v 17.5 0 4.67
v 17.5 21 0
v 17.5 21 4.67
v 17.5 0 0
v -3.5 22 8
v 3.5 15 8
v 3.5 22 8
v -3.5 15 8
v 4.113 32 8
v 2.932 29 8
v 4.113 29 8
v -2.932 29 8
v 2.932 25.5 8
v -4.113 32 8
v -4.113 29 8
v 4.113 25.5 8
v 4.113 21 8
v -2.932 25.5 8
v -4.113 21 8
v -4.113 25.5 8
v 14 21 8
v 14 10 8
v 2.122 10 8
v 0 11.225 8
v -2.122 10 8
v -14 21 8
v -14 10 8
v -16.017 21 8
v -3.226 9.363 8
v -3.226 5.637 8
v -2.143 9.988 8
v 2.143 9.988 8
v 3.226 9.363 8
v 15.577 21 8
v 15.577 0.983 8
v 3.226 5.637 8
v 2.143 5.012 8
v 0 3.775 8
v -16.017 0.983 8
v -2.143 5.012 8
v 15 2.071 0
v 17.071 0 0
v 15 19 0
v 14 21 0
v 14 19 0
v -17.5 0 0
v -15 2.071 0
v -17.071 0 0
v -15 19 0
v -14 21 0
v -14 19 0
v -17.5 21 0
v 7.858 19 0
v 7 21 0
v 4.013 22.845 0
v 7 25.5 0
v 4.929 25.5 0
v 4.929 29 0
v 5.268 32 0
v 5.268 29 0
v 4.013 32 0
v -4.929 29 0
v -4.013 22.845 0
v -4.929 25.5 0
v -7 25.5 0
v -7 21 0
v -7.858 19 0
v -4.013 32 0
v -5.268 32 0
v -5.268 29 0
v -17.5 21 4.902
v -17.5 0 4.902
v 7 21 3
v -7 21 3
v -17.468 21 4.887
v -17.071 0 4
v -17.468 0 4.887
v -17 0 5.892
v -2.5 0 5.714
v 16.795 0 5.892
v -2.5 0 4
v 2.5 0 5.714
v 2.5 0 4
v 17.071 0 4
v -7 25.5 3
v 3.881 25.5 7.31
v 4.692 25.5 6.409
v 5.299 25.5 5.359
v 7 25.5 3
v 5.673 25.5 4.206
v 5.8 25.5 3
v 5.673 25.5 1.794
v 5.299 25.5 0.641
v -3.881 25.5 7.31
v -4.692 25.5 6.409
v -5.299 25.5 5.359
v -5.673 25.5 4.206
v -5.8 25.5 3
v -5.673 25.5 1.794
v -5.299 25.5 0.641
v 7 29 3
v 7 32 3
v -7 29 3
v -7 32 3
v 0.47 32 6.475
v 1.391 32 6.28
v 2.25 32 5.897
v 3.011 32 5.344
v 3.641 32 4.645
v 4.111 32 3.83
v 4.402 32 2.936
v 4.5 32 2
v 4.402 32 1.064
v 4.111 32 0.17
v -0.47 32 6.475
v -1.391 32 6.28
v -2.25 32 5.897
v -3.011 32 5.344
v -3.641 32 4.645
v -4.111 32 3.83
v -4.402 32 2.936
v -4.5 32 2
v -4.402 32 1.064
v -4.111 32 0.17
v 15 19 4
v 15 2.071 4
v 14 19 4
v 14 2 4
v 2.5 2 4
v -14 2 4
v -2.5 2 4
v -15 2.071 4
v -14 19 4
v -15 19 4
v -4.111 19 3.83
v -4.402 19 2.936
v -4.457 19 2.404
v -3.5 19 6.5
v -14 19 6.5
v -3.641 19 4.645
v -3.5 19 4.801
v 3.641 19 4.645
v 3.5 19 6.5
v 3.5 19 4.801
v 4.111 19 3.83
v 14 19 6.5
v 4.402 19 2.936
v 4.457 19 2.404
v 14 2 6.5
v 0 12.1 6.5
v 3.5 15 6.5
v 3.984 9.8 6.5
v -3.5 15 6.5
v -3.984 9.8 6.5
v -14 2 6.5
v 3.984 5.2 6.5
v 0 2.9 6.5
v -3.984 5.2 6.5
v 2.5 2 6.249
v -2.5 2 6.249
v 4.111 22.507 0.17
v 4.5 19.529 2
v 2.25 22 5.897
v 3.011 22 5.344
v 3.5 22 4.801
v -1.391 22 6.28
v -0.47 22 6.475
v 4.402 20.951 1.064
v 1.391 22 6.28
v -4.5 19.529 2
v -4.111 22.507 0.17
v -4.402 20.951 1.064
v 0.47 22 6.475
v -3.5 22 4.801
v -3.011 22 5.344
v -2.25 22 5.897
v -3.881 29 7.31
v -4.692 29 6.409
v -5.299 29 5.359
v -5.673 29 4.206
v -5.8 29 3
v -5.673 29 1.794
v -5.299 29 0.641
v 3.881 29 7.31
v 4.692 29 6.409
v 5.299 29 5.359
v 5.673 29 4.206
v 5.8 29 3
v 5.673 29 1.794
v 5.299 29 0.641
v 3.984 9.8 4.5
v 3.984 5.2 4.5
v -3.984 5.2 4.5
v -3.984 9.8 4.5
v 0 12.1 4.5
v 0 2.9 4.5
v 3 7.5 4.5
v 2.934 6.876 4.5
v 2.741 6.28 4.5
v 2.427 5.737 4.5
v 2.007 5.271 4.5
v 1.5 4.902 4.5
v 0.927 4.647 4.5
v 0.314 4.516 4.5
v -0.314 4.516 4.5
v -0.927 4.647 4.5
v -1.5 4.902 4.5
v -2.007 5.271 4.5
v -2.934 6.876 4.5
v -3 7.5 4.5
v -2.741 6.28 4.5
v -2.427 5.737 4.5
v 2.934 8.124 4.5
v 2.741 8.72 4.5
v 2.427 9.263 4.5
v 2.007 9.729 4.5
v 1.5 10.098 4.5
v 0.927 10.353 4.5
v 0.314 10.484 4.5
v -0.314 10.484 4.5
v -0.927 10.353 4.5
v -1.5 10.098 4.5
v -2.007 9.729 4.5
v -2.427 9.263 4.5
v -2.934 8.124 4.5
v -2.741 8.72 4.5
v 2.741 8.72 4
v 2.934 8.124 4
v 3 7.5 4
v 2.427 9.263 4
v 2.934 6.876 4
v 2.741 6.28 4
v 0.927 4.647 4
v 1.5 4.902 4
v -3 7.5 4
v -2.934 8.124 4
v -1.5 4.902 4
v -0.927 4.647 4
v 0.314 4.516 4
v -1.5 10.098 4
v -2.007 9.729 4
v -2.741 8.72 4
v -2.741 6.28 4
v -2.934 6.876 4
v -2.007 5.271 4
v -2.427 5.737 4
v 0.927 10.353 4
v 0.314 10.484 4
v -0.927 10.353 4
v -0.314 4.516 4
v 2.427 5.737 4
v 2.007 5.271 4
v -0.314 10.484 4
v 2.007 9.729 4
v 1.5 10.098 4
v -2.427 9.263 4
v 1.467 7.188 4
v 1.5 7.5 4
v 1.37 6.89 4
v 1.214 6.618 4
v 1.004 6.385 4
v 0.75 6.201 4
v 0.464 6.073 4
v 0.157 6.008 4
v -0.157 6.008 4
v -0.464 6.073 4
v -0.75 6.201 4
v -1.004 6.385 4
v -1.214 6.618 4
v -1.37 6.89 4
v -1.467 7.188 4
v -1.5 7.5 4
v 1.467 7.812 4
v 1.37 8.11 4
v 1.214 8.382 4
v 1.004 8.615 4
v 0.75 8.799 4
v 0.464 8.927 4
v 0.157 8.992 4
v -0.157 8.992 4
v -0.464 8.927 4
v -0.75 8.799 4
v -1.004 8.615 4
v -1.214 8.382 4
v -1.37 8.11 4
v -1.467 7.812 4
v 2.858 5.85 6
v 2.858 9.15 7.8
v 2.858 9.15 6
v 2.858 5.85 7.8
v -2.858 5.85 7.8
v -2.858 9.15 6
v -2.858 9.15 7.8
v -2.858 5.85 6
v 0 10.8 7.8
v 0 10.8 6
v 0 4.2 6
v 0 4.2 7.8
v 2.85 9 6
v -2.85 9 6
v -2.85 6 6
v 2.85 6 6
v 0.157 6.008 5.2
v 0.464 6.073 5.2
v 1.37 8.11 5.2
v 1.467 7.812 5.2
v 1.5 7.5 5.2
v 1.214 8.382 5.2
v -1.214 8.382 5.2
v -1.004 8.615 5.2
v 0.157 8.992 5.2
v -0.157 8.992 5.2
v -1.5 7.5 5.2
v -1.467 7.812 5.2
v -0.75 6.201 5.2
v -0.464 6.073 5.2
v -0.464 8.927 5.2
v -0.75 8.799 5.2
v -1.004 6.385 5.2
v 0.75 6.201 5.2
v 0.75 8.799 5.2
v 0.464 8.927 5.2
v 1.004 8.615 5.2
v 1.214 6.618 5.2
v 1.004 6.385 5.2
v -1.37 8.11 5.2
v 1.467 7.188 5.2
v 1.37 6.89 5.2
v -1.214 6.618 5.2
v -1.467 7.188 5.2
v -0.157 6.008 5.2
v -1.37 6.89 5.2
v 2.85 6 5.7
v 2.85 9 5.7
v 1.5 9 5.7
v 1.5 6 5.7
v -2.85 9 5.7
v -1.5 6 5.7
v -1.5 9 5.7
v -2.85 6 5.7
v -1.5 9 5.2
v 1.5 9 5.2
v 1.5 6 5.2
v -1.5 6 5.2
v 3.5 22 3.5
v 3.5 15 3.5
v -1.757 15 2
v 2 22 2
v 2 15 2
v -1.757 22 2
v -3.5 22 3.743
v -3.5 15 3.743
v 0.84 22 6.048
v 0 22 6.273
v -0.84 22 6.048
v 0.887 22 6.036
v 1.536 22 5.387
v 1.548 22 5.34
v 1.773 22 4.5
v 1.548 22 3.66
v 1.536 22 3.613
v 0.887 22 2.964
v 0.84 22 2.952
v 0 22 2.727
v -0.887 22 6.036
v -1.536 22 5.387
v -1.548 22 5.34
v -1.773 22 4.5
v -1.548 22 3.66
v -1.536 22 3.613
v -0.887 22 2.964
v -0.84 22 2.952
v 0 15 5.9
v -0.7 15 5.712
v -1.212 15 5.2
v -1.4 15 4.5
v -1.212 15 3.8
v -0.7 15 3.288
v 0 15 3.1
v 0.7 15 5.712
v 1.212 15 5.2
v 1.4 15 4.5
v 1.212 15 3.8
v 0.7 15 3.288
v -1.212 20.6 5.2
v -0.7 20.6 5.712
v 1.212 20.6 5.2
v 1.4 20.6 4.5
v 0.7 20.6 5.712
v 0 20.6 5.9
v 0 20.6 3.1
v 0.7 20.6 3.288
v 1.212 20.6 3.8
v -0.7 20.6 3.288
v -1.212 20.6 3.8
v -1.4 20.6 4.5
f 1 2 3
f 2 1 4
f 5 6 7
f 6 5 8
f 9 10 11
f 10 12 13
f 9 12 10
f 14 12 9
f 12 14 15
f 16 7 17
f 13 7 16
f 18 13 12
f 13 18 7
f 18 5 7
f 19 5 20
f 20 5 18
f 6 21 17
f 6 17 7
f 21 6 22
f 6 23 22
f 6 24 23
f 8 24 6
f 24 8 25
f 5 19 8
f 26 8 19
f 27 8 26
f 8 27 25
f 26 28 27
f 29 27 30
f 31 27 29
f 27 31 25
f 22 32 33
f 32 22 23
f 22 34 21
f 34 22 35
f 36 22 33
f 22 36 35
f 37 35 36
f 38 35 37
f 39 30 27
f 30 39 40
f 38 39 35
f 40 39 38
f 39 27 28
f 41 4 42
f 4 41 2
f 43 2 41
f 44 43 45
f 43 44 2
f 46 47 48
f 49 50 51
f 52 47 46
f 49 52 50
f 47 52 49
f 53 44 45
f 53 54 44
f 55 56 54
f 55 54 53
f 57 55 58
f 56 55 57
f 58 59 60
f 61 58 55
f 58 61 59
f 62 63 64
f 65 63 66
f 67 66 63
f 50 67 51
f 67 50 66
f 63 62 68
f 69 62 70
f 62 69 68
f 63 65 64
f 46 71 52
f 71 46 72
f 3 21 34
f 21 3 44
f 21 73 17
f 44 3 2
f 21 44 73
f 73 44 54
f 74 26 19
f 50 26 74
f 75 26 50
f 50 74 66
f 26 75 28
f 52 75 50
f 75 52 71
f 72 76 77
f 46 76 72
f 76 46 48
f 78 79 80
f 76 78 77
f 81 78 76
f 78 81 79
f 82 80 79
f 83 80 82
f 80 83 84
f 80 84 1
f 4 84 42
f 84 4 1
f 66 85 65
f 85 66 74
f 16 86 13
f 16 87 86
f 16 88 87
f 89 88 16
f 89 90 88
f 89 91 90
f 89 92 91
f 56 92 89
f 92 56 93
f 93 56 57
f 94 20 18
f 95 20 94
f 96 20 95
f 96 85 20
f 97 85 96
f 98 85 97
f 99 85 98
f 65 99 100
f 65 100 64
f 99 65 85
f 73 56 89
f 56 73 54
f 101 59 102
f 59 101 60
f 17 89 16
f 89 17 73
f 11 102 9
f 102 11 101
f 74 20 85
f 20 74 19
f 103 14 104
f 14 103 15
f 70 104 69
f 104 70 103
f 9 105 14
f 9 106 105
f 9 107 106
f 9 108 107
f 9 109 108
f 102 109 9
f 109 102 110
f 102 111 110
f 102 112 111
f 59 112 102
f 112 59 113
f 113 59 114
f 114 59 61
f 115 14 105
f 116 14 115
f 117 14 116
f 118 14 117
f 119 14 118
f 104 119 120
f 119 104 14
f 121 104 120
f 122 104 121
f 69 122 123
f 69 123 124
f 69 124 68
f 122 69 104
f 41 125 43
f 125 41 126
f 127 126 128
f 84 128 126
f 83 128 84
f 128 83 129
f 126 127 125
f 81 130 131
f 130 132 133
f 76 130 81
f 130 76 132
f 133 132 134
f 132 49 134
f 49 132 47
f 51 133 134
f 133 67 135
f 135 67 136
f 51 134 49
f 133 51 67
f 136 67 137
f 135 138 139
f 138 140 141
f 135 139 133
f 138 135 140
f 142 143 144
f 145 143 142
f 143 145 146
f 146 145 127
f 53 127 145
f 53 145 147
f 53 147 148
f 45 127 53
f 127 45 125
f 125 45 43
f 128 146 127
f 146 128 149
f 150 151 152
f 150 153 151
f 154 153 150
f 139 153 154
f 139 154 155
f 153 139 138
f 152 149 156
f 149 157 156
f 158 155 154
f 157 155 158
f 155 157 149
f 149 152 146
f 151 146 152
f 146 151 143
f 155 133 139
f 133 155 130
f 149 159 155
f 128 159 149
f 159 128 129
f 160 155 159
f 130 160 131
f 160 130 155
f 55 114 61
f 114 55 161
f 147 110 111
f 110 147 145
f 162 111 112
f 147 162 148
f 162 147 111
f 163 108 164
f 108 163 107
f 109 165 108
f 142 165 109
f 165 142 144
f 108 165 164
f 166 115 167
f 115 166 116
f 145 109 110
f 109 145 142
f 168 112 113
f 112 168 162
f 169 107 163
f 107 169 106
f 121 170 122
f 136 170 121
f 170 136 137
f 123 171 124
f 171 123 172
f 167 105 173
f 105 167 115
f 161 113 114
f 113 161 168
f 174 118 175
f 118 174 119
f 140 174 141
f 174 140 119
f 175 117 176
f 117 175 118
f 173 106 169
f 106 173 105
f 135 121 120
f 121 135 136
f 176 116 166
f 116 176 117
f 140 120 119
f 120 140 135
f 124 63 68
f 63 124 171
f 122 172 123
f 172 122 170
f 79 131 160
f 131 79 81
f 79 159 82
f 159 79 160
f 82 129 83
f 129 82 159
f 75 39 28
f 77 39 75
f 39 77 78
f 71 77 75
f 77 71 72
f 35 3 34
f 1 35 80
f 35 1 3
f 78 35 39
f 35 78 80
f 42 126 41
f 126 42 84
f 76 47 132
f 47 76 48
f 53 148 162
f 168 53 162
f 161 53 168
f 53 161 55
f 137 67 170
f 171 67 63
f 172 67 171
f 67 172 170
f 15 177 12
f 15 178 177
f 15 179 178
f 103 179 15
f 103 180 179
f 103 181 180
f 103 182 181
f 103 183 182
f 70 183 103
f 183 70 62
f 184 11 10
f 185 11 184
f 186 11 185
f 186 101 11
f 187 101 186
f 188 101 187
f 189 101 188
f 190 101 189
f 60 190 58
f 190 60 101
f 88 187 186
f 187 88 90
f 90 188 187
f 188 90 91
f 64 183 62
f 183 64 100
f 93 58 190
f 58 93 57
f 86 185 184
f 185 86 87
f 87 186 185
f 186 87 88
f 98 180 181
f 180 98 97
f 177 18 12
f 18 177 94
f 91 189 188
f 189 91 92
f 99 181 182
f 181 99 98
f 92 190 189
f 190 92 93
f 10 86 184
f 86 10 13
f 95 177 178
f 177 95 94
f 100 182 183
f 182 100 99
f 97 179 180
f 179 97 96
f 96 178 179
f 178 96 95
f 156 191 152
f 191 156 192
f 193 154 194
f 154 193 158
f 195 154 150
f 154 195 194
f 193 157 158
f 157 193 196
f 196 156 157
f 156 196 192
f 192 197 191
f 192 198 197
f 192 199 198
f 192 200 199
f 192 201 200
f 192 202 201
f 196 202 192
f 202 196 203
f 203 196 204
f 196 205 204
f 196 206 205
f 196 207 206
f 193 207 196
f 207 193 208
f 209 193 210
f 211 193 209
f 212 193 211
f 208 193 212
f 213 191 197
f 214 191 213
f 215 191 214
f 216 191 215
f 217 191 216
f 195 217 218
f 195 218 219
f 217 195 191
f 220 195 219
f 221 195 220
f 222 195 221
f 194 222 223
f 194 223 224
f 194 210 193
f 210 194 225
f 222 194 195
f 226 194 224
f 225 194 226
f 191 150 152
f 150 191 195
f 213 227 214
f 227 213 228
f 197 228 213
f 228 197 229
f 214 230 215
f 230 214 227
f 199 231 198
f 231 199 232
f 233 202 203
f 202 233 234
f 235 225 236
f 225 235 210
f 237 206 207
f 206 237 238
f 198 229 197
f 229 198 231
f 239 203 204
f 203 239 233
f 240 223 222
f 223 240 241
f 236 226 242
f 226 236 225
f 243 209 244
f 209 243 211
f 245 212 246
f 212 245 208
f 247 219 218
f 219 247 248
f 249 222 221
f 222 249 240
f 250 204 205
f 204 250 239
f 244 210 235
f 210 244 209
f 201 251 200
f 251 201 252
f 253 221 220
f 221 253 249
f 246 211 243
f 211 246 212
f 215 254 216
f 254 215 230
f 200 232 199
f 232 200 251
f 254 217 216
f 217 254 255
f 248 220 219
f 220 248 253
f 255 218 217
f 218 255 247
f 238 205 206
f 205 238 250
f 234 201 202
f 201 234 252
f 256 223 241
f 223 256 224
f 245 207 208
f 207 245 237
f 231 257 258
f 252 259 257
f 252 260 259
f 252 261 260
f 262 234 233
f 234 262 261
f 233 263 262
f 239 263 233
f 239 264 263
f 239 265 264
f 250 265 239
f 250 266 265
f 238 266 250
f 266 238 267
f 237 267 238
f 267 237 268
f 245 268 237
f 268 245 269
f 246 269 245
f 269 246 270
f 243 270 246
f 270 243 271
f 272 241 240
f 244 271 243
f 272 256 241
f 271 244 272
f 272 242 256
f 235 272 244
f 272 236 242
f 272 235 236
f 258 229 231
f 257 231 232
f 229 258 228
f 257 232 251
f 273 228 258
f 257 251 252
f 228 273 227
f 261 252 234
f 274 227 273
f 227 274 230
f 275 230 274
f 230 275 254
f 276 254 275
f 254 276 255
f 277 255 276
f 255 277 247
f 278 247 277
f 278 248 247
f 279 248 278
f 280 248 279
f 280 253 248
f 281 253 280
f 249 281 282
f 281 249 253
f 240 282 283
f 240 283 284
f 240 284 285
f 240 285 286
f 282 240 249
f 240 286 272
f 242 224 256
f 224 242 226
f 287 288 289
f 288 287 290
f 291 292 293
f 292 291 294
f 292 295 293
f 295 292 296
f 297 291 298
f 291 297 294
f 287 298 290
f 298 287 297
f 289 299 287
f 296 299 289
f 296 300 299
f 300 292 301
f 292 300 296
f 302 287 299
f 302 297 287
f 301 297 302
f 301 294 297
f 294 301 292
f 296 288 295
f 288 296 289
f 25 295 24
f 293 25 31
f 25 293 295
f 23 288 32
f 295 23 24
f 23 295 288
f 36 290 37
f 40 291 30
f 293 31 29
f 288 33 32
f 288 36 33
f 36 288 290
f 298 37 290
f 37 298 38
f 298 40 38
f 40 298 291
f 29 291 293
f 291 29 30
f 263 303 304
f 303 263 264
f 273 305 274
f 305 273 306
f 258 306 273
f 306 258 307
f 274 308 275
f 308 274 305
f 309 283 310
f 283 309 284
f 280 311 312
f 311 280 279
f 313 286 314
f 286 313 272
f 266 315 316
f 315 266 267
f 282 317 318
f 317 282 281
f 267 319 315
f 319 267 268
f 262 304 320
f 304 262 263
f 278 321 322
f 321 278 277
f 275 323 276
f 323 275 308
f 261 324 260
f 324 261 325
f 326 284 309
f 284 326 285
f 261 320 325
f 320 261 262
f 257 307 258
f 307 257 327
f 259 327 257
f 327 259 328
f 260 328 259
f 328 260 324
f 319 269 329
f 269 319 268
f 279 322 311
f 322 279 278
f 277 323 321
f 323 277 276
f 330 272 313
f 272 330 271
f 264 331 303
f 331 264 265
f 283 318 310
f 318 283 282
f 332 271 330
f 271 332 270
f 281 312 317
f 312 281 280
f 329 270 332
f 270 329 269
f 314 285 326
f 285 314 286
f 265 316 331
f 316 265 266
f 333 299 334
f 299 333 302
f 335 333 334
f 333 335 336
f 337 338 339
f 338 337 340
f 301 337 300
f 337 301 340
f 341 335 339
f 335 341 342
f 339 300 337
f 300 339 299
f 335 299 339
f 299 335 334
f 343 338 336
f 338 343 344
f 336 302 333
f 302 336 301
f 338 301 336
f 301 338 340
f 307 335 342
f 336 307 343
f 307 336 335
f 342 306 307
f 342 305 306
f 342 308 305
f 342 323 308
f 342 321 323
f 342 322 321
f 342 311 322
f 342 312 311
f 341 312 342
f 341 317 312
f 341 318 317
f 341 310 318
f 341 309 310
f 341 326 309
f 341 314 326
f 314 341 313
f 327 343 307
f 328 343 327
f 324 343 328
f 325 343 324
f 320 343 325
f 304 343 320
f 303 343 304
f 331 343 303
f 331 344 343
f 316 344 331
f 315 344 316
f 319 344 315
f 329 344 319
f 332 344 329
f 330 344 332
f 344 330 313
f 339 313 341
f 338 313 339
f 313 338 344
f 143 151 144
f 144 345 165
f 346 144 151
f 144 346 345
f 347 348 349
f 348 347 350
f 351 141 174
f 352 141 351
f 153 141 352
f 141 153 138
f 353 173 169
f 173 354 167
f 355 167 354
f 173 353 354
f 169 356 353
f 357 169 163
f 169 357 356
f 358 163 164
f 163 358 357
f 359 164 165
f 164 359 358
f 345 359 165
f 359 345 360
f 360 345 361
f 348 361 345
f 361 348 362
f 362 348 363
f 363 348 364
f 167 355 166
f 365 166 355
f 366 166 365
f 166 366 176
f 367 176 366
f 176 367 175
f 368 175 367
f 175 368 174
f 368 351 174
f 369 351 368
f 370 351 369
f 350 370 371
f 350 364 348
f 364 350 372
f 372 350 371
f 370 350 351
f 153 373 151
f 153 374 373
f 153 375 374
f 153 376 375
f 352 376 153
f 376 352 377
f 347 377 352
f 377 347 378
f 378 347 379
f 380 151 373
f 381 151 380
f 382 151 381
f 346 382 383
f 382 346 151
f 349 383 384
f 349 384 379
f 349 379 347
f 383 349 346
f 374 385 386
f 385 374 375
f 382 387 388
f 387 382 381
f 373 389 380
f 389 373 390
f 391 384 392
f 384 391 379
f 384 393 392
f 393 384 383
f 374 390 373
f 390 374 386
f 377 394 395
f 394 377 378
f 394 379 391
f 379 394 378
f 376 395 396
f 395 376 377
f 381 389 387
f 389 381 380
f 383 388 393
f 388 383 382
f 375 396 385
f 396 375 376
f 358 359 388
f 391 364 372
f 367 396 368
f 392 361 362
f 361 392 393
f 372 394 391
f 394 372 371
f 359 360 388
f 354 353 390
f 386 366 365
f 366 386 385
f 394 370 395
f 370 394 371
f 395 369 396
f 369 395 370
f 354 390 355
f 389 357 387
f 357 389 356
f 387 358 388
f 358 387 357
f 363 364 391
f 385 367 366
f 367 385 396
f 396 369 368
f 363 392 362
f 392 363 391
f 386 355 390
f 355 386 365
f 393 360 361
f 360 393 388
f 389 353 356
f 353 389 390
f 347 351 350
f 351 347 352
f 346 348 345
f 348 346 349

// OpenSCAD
// PRUSA iteration3
// Heatbed cable cover
// GNU GPL v3
// Josef Průša <iam@josefprusa.cz> and contributors
// http://www.reprap.org/wiki/Prusa_Mendel
// http://prusamendel.org


module cover(){
  translate([-17.5,0,0]) cube([35,21,8]); // cover
  translate([-7,19,0]) cube([3,6.5,3]); // tube reinforcement
  translate([4,19,0]) cube([3,6.5,3]);  // tube reinforcement
  translate([0,32,3]) rotate([90,0,0]) cylinder(h=12,r=7,$fn=6);  // cable tube outer
}

module inside_cut(){
  translate([-15,-1,-1]) cube([30,20,5]);  // inside cut
  translate([-14,2,4])  cube([28,17,2.5]);  // inside cut

  translate([0,32,2]) rotate([90,0,0]) cylinder(h=16,r=4.5,$fn=30);  // cable tube inner

  translate([-14,10,-5])  cube([28,25,5]);  // inside cut
  translate([-14,10,8])  cube([28,25,3]);  // inside cut

  translate([-2.5,-6,1])  rotate([15,0,0]) cube([5,10,3]);  // LED

  translate([-22,-5,7]) rotate([0,25,0]) cube([5,40,6]);  // corners
  translate([15,-5,9]) rotate([0,60,0]) cube([6,40,5]);  // corners
  translate([20,-5,7]) rotate([0,25,90]) cube([5,40,5]);  // corners

  translate([15,-5,-1]) rotate([0,0,45]) cube([5,5,5]);  // corners
  translate([-15,-5,-1]) rotate([0,0,45]) cube([5,5,5]);  // corners

  translate([8,13,-10]) rotate([0,-45,45])  cube([10,10,10]);   // corners
  translate([-8,13,-10]) rotate([0,-45,-45])  cube([10,10,10]);   // corners
}

module ziptie(){
  difference(){
    translate([0,29,3]) rotate([90,0,0]) cylinder(h=3.5,r=10,$fn=30);  // cable tube outer
    translate([0,29,3]) rotate([90,0,0]) cylinder(h=3.5,r=5.8,$fn=30);  // cable tube outer
  }
}

module filament_holder(){
  difference(){
    translate([-3.5,15,2]) rotate([0,0,0])  cube([7,7,6]);  // body ; previous translate([-2.5,15,2]) cube([5,7,6]);
    translate([0,24,4.5]) rotate([90,0,0]) cylinder(h=10,r=1.4,$fn=12);  // filament
    translate([0,22.1,4.5]) rotate([90,0,0]) cylinder(h=1.5,r1=1.8,r2=1.4,$fn=12);  // filament

    translate([-6,15,2]) rotate([0,45,0])  cube([4,15,3]);  // corners ; previous ([-5,15,1]) cube([3,15,3])
    translate([1,15,1]) rotate([0,45,0])  cube([3,15,4]);  // corners ; previous  cube([3,15,3])
  }
}

module m3_screw(){
  translate([0,7.5,6]) rotate([0,0,90]) cylinder(h=2.5,r=3.3,$fn=6);  // M3 HEAD
  translate([0,7.5,7.8]) rotate([0,0,90]) cylinder(h=0.8,r1=3.3,r2=5,$fn=6);  // M3 HEAD
  translate([0,7.5,-10]) rotate([0,0,0]) cylinder(h=20,r=1.5,$fn=30);  // M3 thread
}

module nut_trap(){
  translate([0,7.5,4.5]) rotate([0,0,90]) cylinder(h=2.5,r=4.6,$fn=6);  // M3 HEAD
  translate([0,7.5,4]) rotate([0,0,0]) cylinder(h=1,r=3,$fn=30);
}

difference(){
  union(){
    difference(){
      cover();
      inside_cut();
      ziptie();
    }
    nut_trap();
  }
  m3_screw();
  translate([0,7.5,6.2]) rotate([0,0,0]) cube([5.7,3,1],center=true);
  translate([0,7.5,5.7]) rotate([0,0,0]) cube([3,3,1],center=true);
}

filament_holder();
